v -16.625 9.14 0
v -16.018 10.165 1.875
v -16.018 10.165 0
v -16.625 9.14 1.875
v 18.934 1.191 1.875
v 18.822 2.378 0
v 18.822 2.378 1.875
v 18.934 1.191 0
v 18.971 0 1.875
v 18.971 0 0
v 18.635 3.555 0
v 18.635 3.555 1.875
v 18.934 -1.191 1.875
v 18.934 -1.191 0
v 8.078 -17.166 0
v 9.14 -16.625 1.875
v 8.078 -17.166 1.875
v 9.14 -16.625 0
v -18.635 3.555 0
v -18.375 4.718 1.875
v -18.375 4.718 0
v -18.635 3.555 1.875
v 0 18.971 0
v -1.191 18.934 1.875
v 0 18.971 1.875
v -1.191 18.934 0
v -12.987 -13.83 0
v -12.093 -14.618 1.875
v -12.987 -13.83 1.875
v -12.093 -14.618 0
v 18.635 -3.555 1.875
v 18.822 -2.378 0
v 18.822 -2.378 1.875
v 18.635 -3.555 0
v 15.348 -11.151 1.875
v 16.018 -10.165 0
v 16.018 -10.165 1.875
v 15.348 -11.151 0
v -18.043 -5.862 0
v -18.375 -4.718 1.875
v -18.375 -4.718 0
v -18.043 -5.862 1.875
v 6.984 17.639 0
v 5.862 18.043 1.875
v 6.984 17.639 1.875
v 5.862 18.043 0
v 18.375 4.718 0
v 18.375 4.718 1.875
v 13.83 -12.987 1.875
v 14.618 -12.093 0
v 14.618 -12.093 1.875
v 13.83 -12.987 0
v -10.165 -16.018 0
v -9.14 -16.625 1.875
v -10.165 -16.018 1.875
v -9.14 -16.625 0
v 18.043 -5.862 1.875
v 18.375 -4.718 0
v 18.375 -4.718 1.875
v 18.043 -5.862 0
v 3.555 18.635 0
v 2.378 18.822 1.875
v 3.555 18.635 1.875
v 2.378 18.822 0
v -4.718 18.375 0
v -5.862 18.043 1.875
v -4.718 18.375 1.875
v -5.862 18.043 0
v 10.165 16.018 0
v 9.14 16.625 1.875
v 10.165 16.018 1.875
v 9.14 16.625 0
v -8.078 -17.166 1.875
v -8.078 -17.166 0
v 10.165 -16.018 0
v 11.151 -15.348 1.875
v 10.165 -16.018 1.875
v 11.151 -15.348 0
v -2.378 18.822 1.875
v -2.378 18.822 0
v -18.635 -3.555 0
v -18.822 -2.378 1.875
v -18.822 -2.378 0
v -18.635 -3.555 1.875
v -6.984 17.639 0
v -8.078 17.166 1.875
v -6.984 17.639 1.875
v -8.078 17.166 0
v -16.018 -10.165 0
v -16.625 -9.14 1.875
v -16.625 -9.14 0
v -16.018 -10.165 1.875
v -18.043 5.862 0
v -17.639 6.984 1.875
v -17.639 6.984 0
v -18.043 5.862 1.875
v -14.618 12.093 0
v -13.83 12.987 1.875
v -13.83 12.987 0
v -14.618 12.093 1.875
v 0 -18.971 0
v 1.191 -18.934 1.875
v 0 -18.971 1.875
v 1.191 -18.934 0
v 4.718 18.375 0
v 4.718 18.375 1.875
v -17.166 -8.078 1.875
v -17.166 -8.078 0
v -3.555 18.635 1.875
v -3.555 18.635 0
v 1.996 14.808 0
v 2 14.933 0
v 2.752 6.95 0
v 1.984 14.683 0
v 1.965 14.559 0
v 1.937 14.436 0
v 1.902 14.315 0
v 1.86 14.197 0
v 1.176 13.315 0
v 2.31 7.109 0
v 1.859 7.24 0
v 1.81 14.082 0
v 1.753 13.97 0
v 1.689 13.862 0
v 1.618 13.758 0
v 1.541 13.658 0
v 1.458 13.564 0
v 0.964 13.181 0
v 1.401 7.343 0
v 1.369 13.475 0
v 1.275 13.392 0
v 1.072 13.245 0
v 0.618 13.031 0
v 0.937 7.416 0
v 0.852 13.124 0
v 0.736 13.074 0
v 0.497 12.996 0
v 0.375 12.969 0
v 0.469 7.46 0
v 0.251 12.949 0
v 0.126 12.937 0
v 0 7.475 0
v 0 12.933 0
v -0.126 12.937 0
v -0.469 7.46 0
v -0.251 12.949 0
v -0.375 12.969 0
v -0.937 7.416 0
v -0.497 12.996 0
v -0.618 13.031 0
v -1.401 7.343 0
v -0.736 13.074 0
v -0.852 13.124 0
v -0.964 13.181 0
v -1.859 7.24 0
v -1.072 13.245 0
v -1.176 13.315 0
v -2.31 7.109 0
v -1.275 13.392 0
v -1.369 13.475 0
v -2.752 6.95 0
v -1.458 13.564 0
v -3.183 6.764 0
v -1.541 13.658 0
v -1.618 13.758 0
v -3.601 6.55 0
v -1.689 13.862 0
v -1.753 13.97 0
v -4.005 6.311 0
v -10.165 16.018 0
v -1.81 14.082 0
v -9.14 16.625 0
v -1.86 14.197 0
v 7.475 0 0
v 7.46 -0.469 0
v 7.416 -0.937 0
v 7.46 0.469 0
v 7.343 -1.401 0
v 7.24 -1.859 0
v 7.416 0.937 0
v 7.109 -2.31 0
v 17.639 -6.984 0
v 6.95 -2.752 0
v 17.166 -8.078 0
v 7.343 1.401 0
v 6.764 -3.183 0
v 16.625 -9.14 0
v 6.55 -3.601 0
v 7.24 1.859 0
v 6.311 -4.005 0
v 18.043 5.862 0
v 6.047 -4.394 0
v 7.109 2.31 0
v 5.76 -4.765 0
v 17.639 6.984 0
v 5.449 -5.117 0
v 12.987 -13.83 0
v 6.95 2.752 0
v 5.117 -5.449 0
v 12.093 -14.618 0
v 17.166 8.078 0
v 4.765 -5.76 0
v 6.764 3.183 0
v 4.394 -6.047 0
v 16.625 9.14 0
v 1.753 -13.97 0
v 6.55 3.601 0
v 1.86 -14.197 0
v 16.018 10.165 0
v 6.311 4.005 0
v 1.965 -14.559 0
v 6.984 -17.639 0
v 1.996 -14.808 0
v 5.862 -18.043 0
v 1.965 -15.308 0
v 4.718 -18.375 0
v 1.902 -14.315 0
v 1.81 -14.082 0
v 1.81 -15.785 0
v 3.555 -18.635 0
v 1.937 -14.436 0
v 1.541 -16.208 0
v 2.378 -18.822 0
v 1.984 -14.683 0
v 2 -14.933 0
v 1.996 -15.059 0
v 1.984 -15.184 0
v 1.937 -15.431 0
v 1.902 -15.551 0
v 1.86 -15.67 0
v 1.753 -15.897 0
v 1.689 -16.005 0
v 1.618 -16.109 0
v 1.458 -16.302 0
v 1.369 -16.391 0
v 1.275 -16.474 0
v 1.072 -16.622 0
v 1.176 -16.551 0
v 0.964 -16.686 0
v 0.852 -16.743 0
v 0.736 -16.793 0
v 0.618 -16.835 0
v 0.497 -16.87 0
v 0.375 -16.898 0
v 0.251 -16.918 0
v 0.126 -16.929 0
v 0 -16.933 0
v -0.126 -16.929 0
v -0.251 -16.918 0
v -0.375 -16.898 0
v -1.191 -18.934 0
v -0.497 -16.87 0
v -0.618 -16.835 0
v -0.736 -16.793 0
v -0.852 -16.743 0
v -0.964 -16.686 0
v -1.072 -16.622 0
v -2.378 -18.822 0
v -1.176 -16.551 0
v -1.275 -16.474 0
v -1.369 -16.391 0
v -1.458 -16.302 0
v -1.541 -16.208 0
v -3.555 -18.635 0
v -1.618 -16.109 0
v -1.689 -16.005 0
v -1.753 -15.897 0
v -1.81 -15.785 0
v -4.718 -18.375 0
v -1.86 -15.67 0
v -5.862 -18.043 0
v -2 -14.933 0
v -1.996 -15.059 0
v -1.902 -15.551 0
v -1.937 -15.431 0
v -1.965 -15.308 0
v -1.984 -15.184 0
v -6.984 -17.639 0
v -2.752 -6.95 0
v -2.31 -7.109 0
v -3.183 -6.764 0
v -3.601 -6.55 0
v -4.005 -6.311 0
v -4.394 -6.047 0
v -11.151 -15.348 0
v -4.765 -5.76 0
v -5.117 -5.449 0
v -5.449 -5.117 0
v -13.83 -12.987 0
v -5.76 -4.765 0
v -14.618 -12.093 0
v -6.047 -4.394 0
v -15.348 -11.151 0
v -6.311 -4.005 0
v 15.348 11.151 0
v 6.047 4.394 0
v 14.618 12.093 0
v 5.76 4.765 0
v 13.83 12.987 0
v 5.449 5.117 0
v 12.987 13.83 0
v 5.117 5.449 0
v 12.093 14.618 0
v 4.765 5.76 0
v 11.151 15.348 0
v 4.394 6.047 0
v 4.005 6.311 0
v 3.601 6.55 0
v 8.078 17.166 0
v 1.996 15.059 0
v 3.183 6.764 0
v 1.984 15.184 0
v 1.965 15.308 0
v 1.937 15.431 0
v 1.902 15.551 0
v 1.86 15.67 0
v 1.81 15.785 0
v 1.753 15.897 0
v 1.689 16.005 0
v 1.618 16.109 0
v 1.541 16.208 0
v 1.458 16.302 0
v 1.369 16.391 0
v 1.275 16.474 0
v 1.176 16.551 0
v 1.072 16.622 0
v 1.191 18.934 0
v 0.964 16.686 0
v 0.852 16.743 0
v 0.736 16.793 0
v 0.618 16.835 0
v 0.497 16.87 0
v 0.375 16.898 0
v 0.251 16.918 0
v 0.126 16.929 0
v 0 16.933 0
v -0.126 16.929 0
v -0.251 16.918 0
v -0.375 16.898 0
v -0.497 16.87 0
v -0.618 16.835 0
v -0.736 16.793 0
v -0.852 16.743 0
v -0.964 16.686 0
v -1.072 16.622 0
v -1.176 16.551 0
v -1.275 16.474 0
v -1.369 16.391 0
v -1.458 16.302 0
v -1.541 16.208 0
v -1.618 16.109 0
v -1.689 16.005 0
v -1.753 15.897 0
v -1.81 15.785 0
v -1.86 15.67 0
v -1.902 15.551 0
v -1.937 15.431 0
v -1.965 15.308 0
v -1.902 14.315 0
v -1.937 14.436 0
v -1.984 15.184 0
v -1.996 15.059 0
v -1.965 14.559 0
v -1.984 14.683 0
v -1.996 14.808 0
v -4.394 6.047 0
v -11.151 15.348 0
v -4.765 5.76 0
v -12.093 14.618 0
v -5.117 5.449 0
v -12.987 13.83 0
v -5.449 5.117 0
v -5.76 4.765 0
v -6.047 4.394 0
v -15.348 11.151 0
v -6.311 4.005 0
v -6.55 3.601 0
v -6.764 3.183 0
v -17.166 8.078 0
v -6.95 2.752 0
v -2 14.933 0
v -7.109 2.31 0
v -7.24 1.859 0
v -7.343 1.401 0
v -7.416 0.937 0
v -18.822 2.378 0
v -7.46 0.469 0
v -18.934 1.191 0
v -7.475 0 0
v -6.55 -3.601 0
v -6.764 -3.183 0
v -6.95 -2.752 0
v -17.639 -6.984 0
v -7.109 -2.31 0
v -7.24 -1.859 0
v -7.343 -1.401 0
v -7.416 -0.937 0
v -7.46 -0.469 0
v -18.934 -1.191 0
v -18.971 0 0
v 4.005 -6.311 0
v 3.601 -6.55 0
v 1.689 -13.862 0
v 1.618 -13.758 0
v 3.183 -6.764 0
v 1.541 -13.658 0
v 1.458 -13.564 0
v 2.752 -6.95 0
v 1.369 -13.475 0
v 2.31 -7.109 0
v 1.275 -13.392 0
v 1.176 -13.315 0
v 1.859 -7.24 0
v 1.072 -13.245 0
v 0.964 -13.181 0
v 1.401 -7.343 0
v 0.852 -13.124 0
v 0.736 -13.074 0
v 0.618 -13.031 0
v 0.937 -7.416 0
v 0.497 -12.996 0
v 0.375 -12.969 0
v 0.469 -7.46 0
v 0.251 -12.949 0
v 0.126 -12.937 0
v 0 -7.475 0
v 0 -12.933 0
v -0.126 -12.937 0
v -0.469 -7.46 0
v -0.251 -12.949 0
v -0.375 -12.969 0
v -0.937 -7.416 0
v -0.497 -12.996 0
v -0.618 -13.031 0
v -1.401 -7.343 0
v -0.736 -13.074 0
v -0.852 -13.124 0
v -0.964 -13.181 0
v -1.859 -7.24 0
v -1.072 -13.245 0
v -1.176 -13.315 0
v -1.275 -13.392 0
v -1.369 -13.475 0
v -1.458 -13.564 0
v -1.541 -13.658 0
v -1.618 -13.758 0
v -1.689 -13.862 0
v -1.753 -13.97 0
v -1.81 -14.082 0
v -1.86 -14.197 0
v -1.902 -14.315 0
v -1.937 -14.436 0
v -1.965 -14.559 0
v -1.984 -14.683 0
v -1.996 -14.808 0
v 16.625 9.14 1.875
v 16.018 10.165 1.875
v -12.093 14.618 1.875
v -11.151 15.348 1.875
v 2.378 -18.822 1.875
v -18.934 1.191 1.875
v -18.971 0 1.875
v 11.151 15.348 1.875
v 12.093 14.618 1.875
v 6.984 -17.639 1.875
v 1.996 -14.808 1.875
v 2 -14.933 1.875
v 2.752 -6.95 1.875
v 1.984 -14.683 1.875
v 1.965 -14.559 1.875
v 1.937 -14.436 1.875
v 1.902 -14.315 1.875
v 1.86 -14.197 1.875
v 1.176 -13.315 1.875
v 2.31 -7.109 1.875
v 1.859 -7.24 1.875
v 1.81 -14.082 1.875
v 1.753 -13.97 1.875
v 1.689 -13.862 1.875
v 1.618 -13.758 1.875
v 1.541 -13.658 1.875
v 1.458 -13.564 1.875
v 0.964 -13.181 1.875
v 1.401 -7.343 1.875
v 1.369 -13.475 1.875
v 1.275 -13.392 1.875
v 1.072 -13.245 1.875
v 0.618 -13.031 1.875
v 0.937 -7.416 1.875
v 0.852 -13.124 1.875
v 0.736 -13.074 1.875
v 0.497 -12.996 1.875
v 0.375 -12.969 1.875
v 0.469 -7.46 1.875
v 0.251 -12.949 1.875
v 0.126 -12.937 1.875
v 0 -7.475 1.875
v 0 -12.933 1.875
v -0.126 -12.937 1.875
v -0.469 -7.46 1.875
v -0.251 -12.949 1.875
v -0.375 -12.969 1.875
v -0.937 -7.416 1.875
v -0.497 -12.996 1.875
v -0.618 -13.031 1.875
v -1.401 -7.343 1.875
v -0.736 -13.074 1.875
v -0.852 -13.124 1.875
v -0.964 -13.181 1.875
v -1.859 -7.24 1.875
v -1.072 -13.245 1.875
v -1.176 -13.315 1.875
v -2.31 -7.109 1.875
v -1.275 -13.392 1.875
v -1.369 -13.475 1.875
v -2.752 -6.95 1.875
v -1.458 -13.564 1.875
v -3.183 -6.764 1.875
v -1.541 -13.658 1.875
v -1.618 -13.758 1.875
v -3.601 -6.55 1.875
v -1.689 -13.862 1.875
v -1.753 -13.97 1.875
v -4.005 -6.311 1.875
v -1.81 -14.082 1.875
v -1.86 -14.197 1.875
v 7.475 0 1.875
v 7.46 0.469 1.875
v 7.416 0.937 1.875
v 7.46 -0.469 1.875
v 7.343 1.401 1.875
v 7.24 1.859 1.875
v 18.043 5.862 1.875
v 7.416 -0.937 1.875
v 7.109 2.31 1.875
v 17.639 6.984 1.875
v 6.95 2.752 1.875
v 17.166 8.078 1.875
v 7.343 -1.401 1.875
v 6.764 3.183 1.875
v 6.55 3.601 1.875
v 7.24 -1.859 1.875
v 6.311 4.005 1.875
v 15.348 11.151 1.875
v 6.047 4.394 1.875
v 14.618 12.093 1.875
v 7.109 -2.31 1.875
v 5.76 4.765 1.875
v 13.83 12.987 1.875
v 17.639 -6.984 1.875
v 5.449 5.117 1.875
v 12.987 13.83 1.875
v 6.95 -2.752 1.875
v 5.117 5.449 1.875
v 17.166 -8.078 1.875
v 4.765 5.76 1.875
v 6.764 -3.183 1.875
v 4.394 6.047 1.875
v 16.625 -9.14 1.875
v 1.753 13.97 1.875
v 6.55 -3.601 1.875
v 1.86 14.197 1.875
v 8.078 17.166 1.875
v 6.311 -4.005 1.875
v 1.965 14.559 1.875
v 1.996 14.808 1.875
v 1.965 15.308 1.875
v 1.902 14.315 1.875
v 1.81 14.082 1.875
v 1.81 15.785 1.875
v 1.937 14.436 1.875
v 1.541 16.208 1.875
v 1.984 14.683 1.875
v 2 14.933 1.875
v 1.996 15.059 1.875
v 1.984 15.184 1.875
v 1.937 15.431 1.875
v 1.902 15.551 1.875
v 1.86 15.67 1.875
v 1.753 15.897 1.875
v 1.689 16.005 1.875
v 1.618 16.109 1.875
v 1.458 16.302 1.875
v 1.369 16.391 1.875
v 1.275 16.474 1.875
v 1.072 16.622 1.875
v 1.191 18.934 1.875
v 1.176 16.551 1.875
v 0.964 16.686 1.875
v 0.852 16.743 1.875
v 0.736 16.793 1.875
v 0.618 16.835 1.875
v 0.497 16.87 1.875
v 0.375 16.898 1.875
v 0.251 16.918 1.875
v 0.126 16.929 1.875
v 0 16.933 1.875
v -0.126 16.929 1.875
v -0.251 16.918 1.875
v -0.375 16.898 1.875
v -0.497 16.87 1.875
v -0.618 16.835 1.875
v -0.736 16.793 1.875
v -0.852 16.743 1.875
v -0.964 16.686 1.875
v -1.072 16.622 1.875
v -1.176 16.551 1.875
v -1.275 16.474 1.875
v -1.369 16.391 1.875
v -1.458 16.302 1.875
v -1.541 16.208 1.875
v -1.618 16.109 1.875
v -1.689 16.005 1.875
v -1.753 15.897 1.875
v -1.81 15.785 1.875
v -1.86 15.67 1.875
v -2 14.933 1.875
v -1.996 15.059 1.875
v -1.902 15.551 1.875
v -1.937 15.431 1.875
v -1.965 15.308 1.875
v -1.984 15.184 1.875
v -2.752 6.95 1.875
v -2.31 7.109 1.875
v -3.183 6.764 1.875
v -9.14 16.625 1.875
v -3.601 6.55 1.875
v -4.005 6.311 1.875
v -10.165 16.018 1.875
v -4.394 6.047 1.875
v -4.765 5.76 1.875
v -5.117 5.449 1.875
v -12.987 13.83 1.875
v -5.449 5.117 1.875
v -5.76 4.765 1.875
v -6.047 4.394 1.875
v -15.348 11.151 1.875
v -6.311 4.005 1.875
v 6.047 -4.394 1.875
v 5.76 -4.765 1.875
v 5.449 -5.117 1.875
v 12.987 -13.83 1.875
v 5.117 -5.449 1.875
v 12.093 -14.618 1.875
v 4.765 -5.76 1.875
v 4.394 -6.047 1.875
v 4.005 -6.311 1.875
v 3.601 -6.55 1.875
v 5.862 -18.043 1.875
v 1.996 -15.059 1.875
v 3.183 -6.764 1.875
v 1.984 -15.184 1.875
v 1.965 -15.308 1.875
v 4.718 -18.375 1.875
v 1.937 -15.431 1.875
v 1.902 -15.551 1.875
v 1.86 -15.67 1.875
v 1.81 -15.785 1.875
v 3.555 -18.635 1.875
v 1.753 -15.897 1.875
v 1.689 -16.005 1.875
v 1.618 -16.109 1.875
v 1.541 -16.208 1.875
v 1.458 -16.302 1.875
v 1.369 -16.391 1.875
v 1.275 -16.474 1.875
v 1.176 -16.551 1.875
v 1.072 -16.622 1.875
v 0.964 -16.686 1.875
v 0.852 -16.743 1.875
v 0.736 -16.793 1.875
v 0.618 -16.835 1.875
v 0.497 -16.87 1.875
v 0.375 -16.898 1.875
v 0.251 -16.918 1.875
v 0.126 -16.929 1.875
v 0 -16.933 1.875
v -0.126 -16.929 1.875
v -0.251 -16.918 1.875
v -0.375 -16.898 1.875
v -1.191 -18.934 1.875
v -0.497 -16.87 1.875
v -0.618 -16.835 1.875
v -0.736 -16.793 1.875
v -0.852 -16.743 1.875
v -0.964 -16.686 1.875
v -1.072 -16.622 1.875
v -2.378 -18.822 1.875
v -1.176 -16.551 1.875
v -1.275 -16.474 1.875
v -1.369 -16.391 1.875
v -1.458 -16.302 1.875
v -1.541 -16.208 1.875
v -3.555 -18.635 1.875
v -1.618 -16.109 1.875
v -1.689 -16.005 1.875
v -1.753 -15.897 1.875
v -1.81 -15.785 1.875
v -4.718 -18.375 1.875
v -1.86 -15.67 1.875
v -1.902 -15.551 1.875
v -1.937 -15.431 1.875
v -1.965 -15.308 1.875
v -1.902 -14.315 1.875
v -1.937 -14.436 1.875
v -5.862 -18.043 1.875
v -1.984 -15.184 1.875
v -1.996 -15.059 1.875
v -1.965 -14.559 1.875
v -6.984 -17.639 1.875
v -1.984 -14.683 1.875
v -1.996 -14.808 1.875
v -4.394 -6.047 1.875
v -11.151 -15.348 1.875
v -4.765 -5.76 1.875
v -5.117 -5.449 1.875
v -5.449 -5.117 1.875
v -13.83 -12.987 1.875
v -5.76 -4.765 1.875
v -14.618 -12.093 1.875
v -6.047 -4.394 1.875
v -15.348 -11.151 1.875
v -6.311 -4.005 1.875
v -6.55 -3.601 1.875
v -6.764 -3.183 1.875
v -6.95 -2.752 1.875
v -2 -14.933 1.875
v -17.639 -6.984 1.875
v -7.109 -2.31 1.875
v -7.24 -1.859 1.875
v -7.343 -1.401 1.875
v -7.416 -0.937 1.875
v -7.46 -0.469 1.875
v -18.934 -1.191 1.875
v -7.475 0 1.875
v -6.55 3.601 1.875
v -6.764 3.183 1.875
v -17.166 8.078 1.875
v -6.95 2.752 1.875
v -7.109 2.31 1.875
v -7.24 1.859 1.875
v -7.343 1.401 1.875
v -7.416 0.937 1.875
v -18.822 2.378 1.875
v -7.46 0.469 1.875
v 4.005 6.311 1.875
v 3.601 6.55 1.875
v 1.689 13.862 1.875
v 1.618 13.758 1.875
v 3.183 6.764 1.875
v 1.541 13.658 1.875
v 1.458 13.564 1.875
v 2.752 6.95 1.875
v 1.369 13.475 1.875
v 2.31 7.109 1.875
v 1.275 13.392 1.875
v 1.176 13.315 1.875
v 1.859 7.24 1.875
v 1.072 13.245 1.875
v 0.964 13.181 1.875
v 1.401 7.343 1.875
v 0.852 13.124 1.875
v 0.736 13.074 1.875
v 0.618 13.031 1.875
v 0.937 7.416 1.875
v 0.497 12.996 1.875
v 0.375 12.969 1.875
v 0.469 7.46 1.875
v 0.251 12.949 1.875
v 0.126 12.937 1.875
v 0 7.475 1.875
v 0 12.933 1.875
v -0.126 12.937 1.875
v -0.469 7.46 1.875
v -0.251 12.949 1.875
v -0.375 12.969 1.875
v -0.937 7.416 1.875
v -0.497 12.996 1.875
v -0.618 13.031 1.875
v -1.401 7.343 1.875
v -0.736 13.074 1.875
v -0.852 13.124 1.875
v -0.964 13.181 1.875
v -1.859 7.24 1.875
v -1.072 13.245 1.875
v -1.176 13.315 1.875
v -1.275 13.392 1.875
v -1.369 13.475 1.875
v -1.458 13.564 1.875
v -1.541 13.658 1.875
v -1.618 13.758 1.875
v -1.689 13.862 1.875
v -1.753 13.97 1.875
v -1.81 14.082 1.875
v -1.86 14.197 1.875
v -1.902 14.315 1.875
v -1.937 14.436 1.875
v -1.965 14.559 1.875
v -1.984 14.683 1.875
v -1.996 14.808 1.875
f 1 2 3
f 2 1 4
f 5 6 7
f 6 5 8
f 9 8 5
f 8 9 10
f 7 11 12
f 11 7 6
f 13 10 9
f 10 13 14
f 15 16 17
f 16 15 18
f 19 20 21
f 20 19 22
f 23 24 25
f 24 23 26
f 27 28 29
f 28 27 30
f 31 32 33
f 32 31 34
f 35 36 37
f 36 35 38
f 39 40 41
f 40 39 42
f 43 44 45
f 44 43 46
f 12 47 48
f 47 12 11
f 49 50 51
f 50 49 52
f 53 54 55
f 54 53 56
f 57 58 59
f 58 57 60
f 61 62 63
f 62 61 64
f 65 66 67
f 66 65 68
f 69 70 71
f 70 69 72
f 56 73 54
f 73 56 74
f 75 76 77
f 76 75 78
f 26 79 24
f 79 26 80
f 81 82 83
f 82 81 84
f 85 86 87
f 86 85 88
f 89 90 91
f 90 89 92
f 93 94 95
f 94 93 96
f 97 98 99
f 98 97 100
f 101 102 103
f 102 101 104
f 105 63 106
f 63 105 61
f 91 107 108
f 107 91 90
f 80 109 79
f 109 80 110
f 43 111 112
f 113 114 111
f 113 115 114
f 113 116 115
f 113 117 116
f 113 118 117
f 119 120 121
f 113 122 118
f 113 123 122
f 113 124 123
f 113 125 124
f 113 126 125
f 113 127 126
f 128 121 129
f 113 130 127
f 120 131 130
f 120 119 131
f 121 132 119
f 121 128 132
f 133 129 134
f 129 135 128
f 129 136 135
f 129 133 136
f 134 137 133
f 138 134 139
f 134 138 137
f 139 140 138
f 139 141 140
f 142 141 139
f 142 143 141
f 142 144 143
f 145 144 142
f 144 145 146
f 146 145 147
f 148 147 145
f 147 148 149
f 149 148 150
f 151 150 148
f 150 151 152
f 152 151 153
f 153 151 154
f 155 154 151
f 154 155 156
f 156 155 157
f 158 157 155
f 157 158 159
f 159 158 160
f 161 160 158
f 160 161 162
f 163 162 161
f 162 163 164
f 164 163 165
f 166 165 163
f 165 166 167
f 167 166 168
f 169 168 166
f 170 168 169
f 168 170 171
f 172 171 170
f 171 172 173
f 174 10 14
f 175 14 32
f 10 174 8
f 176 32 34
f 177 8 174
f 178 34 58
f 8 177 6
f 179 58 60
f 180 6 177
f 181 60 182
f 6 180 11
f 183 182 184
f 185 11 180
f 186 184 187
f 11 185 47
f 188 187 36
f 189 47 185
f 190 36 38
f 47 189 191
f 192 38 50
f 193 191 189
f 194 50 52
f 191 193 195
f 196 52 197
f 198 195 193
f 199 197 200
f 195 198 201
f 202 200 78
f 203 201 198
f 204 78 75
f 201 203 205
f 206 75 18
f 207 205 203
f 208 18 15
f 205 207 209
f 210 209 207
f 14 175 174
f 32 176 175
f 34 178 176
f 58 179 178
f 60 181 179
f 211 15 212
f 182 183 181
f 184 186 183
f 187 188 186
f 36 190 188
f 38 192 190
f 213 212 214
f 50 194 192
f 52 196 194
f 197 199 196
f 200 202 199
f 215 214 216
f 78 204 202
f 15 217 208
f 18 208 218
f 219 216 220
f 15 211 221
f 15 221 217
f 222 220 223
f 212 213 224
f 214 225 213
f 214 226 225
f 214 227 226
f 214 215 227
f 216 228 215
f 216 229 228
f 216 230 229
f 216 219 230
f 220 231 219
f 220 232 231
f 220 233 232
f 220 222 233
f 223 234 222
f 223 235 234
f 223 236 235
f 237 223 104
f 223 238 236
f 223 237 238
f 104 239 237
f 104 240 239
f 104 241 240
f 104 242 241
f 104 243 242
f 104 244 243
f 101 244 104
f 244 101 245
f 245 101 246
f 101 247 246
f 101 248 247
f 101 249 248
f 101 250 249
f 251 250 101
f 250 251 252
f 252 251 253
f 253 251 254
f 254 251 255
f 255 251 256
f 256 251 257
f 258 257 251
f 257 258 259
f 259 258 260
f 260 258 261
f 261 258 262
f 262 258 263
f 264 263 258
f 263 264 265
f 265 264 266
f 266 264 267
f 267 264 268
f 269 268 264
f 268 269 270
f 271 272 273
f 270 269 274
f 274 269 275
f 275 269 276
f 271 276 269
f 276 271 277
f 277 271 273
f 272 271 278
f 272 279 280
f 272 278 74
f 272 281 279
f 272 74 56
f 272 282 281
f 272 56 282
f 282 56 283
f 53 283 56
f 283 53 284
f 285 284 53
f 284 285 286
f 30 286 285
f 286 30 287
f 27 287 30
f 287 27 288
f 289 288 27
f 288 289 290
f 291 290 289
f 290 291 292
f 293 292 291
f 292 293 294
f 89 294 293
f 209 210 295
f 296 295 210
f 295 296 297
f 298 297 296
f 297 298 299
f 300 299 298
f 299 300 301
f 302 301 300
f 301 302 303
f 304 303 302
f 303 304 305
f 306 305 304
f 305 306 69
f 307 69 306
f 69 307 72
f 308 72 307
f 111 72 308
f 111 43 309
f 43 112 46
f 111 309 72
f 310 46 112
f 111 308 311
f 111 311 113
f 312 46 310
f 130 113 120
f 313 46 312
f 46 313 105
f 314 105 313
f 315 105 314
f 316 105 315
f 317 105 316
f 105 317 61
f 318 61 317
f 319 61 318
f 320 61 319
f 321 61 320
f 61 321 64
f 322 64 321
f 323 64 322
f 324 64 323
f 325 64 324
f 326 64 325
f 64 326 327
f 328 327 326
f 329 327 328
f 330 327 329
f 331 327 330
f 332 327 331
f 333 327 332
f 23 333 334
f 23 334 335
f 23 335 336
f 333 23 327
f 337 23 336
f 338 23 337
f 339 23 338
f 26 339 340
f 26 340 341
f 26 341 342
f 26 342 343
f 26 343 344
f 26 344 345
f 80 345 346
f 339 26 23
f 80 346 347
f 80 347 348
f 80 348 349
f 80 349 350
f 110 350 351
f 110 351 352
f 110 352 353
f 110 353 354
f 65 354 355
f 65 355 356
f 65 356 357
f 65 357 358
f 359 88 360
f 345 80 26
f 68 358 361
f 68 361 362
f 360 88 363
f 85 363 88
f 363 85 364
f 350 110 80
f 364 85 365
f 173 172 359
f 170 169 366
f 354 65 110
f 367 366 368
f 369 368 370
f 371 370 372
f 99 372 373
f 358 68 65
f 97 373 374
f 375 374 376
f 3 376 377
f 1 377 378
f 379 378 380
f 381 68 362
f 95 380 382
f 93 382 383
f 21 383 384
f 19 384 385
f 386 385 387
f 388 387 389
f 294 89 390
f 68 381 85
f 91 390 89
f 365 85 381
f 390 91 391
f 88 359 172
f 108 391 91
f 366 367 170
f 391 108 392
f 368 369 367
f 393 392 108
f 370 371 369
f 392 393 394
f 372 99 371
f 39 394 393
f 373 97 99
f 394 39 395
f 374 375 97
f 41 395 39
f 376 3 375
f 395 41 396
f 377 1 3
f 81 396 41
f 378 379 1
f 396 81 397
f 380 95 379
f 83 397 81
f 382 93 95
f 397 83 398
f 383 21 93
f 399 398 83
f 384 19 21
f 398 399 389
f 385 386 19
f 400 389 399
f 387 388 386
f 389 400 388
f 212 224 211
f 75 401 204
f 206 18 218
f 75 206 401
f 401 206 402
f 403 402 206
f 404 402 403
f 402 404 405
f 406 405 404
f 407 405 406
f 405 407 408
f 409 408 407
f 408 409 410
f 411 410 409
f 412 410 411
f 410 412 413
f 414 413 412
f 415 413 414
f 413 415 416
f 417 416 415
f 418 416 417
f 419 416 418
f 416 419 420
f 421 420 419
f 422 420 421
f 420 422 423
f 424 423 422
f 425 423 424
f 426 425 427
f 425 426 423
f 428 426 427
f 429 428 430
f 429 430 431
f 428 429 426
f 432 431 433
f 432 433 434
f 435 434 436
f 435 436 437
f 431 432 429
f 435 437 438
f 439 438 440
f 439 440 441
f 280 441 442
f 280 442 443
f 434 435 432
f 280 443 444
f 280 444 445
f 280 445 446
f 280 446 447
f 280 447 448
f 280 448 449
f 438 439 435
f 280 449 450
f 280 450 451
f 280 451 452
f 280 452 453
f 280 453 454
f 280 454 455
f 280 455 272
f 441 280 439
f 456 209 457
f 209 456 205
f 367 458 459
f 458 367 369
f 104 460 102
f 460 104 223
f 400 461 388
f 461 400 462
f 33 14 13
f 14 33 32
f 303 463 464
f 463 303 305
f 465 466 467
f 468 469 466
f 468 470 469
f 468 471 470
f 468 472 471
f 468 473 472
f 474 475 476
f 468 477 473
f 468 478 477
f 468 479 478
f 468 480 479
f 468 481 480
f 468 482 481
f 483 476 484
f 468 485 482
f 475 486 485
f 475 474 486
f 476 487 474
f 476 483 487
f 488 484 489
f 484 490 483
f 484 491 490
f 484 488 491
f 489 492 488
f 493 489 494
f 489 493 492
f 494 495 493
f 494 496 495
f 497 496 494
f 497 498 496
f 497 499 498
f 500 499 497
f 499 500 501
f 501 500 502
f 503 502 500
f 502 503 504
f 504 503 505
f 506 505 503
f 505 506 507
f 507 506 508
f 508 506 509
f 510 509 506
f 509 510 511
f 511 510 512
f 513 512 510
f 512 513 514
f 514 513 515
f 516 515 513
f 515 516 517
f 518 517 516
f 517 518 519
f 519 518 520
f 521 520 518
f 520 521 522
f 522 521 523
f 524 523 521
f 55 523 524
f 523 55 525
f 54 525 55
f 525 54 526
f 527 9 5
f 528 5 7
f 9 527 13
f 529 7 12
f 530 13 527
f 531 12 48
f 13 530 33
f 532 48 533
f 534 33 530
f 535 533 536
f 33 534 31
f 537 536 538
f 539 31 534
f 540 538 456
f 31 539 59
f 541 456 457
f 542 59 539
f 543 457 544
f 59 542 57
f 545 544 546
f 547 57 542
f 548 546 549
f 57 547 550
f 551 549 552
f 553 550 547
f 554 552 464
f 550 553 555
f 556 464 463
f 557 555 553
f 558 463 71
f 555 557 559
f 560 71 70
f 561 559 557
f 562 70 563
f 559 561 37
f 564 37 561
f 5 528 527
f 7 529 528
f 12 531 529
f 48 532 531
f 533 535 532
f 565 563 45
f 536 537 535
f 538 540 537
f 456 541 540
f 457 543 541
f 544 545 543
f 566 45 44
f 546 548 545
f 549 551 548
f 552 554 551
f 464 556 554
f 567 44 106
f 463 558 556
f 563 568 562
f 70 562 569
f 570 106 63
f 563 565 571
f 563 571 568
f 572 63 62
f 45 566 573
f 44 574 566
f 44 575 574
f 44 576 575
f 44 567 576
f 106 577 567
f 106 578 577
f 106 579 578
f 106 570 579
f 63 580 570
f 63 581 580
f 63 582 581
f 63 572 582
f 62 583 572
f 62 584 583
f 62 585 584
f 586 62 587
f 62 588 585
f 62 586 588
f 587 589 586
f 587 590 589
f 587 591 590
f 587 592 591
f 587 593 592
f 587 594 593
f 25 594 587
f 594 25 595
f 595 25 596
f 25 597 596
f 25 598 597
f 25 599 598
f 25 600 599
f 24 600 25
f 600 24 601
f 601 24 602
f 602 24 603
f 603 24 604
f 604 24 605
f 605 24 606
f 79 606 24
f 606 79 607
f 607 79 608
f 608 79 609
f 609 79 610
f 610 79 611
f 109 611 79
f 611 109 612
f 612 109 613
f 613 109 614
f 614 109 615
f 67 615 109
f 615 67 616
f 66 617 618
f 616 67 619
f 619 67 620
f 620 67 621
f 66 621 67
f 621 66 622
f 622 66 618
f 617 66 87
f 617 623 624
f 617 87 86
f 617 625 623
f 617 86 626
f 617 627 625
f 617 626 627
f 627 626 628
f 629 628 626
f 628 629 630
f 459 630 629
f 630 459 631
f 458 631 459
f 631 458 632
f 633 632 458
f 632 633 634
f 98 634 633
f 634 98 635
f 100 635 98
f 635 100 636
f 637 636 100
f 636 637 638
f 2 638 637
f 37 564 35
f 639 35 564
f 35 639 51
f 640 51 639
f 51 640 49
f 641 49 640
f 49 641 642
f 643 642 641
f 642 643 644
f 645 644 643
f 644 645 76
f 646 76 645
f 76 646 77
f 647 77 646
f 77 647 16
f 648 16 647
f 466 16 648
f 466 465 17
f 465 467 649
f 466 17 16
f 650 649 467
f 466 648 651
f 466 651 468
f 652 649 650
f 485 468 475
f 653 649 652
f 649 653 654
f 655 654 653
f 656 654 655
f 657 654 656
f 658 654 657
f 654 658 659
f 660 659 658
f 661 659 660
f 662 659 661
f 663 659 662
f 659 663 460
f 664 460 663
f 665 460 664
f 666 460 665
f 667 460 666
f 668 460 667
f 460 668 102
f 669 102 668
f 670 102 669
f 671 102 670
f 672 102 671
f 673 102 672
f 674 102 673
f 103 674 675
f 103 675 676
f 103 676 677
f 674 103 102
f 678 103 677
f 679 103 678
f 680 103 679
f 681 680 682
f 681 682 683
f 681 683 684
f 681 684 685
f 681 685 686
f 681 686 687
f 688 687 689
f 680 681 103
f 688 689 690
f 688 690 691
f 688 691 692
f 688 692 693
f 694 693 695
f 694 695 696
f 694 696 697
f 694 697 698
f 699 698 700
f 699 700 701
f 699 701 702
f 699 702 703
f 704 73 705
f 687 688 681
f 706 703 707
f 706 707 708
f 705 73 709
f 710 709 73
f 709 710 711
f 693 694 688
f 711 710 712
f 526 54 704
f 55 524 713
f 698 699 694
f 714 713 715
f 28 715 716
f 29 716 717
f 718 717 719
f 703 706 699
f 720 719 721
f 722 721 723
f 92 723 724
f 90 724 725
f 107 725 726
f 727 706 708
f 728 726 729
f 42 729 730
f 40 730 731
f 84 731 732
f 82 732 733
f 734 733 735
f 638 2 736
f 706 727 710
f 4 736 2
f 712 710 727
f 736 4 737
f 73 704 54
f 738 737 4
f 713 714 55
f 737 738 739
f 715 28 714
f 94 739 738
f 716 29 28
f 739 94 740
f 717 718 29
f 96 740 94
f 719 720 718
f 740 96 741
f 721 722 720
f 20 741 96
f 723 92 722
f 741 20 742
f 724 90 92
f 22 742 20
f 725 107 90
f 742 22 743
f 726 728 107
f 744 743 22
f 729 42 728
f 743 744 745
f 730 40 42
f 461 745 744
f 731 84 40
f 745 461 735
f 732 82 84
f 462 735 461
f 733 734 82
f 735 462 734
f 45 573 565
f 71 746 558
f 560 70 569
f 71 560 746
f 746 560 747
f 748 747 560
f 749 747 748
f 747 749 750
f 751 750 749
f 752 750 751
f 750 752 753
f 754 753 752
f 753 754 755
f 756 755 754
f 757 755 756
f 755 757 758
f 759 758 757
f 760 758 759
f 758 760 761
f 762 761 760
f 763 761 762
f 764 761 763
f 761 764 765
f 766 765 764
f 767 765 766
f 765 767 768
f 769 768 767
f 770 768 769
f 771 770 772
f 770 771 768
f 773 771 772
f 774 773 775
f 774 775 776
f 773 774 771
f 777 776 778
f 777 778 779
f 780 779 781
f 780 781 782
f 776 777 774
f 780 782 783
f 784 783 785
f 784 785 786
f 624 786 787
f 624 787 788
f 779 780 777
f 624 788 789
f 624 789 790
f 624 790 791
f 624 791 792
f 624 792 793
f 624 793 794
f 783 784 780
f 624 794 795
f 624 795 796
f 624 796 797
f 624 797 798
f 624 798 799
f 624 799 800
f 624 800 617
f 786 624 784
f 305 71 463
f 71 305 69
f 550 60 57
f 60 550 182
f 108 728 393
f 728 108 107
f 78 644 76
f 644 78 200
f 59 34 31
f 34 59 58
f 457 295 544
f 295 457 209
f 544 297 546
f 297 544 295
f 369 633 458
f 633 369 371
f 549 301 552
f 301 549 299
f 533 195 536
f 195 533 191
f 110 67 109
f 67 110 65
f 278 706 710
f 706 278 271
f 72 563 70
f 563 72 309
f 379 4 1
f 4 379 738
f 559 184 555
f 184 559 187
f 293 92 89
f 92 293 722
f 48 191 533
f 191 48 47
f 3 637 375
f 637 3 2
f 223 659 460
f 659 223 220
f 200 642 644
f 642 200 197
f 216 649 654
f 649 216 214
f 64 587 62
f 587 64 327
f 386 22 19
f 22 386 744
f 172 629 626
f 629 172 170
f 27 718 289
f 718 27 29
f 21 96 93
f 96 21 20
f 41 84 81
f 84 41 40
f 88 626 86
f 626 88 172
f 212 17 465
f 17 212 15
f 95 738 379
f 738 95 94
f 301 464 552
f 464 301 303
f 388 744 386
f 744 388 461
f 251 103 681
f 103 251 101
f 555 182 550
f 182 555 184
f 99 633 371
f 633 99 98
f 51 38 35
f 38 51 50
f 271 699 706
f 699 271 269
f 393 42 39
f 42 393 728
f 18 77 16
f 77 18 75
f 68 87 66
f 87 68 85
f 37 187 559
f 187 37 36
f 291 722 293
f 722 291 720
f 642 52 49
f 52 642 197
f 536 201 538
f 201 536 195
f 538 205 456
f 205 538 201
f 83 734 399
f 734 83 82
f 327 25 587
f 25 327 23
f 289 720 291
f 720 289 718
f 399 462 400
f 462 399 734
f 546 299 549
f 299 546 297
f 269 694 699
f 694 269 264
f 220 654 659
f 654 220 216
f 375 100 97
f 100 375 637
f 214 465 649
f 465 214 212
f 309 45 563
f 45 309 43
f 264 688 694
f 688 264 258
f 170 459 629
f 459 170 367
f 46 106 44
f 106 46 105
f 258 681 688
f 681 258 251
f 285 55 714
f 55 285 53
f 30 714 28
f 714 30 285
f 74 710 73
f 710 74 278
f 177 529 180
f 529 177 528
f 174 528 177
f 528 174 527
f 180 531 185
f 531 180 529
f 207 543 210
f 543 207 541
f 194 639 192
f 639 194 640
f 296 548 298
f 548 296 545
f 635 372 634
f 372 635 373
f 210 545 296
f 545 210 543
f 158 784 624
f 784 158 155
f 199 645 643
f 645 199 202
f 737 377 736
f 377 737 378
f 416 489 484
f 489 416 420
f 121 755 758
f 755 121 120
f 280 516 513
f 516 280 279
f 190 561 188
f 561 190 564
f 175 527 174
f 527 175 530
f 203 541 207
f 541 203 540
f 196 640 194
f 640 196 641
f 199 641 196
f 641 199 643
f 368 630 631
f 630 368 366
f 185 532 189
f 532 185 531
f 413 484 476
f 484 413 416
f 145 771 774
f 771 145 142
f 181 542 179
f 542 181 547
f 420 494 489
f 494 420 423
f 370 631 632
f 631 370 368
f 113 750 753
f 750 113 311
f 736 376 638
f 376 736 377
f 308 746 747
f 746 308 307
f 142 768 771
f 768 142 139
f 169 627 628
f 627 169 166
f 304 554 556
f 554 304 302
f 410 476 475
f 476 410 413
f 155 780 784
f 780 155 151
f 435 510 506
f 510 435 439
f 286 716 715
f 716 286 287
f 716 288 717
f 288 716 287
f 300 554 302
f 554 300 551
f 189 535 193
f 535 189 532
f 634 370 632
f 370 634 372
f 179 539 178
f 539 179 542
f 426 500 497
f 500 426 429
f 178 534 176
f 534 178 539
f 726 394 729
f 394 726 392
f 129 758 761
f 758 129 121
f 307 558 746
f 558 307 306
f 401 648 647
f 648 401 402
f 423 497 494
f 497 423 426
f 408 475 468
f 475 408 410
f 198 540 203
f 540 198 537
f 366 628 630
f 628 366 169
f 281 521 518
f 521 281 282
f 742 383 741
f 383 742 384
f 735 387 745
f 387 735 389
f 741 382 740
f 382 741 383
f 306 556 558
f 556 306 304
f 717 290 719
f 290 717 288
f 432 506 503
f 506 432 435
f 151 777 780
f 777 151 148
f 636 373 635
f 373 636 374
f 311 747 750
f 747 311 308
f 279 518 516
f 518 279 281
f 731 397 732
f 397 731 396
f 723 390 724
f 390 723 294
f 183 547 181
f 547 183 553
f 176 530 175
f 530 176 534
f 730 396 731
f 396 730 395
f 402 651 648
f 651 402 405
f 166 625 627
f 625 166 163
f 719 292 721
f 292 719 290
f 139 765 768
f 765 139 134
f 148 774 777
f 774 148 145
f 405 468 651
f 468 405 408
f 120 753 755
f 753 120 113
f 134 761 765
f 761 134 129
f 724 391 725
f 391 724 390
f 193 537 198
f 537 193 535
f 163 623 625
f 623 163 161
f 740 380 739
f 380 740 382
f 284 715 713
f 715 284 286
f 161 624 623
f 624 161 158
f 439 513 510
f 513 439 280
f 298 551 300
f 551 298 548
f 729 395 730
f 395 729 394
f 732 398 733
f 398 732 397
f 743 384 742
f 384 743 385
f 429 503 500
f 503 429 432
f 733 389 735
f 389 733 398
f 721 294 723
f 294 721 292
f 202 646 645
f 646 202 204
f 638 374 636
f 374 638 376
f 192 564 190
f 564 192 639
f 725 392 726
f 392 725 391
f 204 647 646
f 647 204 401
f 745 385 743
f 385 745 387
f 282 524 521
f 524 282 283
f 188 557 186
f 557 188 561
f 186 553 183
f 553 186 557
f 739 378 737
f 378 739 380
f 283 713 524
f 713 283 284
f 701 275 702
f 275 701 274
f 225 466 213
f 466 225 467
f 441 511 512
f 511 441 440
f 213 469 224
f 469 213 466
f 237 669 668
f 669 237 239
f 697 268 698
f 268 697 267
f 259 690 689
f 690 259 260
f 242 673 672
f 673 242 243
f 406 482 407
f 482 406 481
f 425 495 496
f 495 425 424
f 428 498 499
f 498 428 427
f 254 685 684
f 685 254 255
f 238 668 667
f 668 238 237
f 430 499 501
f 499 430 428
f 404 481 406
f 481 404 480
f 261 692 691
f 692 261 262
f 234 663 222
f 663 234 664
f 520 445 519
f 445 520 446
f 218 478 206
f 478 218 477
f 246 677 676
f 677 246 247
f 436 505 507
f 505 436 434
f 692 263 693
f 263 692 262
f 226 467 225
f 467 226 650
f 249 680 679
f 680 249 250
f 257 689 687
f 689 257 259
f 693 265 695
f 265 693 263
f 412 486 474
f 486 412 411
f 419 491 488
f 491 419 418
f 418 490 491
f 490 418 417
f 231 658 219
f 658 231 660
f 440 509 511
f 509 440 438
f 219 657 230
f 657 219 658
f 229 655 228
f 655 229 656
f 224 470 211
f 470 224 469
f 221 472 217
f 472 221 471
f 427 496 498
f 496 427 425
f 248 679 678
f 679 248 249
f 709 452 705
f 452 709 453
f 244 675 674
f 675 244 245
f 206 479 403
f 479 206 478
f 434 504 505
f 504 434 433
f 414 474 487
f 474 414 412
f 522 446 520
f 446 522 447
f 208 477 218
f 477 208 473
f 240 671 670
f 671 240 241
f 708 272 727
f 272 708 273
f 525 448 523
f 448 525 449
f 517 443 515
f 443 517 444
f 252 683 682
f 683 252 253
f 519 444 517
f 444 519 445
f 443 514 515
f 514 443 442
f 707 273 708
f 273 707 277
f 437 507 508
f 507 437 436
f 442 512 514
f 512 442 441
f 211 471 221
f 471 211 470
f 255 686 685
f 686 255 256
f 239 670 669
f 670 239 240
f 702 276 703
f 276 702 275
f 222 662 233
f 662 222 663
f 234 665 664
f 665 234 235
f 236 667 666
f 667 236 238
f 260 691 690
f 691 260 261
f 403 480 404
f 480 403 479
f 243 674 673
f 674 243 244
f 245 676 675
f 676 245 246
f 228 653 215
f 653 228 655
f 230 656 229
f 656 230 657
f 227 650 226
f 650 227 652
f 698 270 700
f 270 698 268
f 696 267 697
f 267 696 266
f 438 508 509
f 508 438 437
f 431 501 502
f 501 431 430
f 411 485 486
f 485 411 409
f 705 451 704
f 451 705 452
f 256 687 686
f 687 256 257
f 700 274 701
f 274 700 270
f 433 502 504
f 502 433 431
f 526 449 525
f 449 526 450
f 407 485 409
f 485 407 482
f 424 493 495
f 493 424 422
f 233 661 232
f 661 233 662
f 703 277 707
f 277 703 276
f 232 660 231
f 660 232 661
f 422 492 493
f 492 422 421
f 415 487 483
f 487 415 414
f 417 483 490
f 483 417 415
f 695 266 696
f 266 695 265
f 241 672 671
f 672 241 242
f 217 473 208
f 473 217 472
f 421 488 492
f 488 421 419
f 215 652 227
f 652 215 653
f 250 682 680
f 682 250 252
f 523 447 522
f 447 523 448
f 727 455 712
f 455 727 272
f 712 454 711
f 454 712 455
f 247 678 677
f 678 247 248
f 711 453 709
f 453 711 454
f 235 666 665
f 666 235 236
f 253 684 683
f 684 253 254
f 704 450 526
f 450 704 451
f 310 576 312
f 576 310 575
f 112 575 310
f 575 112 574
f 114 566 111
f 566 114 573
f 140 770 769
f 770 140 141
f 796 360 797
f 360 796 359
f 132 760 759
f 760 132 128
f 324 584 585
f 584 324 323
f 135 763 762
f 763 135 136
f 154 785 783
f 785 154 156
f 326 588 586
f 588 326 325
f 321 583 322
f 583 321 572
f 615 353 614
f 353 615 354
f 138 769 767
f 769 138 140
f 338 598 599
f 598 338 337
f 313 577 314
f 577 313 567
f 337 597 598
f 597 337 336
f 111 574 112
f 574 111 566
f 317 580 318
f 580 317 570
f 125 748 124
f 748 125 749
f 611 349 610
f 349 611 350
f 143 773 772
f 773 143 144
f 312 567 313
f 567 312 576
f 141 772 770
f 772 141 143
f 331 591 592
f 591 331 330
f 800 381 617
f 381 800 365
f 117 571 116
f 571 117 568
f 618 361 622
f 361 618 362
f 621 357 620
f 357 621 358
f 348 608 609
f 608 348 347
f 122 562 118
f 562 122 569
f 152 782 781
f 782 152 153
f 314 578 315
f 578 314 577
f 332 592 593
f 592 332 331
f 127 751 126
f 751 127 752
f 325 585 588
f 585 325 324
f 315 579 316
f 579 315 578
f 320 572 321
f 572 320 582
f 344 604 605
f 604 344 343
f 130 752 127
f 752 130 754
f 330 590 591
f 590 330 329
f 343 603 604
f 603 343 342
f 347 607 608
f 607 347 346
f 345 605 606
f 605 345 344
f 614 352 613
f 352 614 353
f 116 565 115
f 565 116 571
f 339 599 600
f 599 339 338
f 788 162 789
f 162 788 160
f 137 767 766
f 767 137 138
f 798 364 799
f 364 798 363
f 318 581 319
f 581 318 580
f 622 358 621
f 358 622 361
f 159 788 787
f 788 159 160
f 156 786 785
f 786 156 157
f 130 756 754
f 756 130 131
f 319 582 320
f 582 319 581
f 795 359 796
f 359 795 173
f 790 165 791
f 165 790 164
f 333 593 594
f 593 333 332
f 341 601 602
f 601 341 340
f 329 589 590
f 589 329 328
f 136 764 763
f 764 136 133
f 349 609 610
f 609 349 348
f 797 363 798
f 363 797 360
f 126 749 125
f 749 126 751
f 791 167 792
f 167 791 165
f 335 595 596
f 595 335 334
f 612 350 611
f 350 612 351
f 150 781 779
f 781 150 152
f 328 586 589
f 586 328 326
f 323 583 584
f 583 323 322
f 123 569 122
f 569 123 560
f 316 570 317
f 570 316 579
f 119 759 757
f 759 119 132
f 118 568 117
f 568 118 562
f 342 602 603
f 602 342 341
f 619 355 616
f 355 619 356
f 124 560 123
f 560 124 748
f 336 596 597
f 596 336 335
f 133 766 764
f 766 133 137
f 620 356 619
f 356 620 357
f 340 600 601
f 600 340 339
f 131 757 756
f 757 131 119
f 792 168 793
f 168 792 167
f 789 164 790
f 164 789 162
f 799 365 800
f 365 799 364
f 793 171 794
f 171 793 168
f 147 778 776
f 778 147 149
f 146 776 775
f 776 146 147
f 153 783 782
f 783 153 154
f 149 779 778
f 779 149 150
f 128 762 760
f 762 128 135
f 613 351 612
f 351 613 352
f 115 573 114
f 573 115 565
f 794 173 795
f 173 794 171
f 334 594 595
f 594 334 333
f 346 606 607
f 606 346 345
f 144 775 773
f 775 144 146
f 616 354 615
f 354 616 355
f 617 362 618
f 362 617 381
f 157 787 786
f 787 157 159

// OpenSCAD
// file: Vitamins/LinearBearing.scad
use <../Tolerance.scad>

function LinearBearingDiam() = 15 + 3dPrinterTolerance();
function LinearBearingInnerDiam() = 8.3 + 3dPrinterTolerance();
function LinearBearingHeight() = 24 + 3dPrinterTolerance();

module LinearBearing()
{
cylinder(LinearBearingHeight(), LinearBearingDiam()/2, LinearBearingDiam()/2, 0);
}


LinearBearing();
// file: Vitamins/Zrod.scad
use <../Tolerance.scad>

function ZrodLength()=1000;
function ZrodDiameter()=8 + 3dPrinterTolerance();  //base case: 8
function ZrodRadius()=ZrodDiameter()/2;

module Zrod()
{
color("Silver")
cylinder(ZrodLength(), ZrodRadius(), ZrodRadius());
}

Zrod();
// file: Vitamins/PlasticScrew.scad
use <../Tolerance.scad>

function ScrewDiameter()= 3.6 + 3dPrinterTolerance();  
function ScrewLength()= 22 + 3dPrinterTolerance();
function ScrewHeadDiameter()= 6.7 + 3dPrinterTolerance();
function ScrewHeadHeight()= 2.5 + 3dPrinterTolerance();

//err on the side of smaller tolerances for screws

module screw()
{
	union()
	{
		translate([0,0,-ScrewLength()])
		{
			cylinder(ScrewLength(), ScrewDiameter()/2,ScrewDiameter()/2);
		}
		cylinder(ScrewHeadHeight(), ScrewHeadDiameter()/2,ScrewHeadDiameter()/2);
	}
}

screw();
// file: Vitamins/BallBearing.scad
use <../Tolerance.scad>

function BallBearingDiam() = 22 + 3dPrinterTolerance(); //USUALLY 22
function BallBearingHeight() = 7 + 3dPrinterTolerance(); //USUALLY 7
function BallBearingInnerDiam()= 7.9 - 3dPrinterTolerance(); //USUALLY 7.9

module BallBearing()
{
cylinder(BallBearingHeight(), BallBearingDiam()/2, BallBearingDiam()/2);
}


BallBearing();
// file: Tolerance.scad
function LaserCutTolerance() = .02;
function 3dPrinterTolerance() = .4;
// file: Parameters.scad
use<Vitamins/Zrod.scad>
use<Vitamins/LinearBearing.scad>

function mm(i) = i*25.4; 

//Build dimensions (x,y,z)-- x, y and z of printable area, NOT of overall device

//z-rod length, diameter-- dependent on which rods you buy
//(bearing diameter is dependent on rod diameter)


function ZBearingSpacing()= 105;
function ZrodSpacing()=ZBearingSpacing()-LinearBearingDiam()*2-PlasticWidth()*4;
//echo(ZrodSpacing());

//parametric of which hotend is being used (printerbot or bucha nozzle)

//stepper vs servo

//3 parameters (1 for each link) horizontal vs vertical

//paper is a parametric vitamin

//distance between link arms will be calculable based on radius of toolplate




//tolerances
//function LaserCutTolerance() = .02;
//function 3dPrinterTolerance() = .4;



//the equation used for plastic width, it can of course be changed
function PlasticWidth()= (ZrodDiameter()/2);
function SideWidth() = (ZrodDiameter()+PlasticWidth());
// file: Knuckle2.scad
use <Parameters.scad>
use <Tolerance.scad>
use <Vitamins/BallBearing.scad>
use <Vitamins/PlasticScrew.scad>
use <KnuckleCapTop.scad>

$fn=100;

height=ZrodSpacing()+BallBearingDiam()/2;
Bdiam=BallBearingDiam();

function cupOD()= Bdiam/1.25+ScrewDiameter()/2;

module hole(){

	cylinder(ScrewLength(),ScrewDiameter()/2,ScrewDiameter()/2);
}

module BearingRecess(){

	difference(){
		cylinder(BallBearingInnerDiam()/2,cupOD()/1.05,cupOD()/1.05); 
		translate([0,0,-BallBearingHeight()/2]){
			cylinder(BallBearingHeight()*2,(Bdiam/2),(Bdiam/2));
		}
	}
}


module KnuckleShaft(){
	
	difference()	{	
		translate([0,height/2-2,0]){
			rotate([90,0,0]){
				cylinder(height,BallBearingInnerDiam()/2,BallBearingInnerDiam()/2);
			}
		}
		translate([-height/2,-height/2-4,-height]){
			cube([height,height+4,height]);
		}
		translate	([0,-height/4,-Bdiam/4]){
			hole();
		}
		translate([0,height/4,-Bdiam/4]){
			hole();
		}
	}
}
//this is the assembly of the two modules

module Knuckle(){
	
	difference(){	
		union(){
			KnuckleShaft();
			translate([0,-height/2-Bdiam/2-BallBearingInnerDiam()/2,0]){
				BearingRecess();
			}
		}
		translate([0,-height/2-Bdiam/2-BallBearingInnerDiam()/2,BallBearingInnerDiam()/2+1]){
			CapTop(false);
		}		
	}
}
Knuckle();
// main file
use <Knuckle2.scad>
use <Parameters.scad>
use <Tolerance.scad>
use <Vitamins/BallBearing.scad>
use <Vitamins/PlasticScrew.scad>

$fn=100;

function cupOD()=BallBearingDiam()/1.25+ScrewDiameter()/2;

holeinset1=[0,-BallBearingDiam()/1.5,-ScrewLength()+4];
holeinset2=[0,BallBearingDiam()/1.5,-ScrewLength()+4];

module Base(){
	
	difference(){
		cylinder(BallBearingInnerDiam()/4,cupOD()/1.05,cupOD()/1.05);
		translate([0,0,-BallBearingInnerDiam()/4]){
			cylinder(BallBearingInnerDiam()/4+4,(BallBearingInnerDiam()+BallBearingDiam())/4,(BallBearingInnerDiam()+BallBearingDiam())/4);
		}
	}
}

module CapTop(print=true){
	
	if(print==true){
		difference(){
			Base();

			translate(holeinset1){
				hole();
			}
	
			translate(holeinset2){
				hole();
			}
		}
	}else{
		union(){
			Base();
			translate(holeinset1){
				hole();
			}
			translate(holeinset2){
				hole();
			}
		}
	}
}
CapTop(true);
